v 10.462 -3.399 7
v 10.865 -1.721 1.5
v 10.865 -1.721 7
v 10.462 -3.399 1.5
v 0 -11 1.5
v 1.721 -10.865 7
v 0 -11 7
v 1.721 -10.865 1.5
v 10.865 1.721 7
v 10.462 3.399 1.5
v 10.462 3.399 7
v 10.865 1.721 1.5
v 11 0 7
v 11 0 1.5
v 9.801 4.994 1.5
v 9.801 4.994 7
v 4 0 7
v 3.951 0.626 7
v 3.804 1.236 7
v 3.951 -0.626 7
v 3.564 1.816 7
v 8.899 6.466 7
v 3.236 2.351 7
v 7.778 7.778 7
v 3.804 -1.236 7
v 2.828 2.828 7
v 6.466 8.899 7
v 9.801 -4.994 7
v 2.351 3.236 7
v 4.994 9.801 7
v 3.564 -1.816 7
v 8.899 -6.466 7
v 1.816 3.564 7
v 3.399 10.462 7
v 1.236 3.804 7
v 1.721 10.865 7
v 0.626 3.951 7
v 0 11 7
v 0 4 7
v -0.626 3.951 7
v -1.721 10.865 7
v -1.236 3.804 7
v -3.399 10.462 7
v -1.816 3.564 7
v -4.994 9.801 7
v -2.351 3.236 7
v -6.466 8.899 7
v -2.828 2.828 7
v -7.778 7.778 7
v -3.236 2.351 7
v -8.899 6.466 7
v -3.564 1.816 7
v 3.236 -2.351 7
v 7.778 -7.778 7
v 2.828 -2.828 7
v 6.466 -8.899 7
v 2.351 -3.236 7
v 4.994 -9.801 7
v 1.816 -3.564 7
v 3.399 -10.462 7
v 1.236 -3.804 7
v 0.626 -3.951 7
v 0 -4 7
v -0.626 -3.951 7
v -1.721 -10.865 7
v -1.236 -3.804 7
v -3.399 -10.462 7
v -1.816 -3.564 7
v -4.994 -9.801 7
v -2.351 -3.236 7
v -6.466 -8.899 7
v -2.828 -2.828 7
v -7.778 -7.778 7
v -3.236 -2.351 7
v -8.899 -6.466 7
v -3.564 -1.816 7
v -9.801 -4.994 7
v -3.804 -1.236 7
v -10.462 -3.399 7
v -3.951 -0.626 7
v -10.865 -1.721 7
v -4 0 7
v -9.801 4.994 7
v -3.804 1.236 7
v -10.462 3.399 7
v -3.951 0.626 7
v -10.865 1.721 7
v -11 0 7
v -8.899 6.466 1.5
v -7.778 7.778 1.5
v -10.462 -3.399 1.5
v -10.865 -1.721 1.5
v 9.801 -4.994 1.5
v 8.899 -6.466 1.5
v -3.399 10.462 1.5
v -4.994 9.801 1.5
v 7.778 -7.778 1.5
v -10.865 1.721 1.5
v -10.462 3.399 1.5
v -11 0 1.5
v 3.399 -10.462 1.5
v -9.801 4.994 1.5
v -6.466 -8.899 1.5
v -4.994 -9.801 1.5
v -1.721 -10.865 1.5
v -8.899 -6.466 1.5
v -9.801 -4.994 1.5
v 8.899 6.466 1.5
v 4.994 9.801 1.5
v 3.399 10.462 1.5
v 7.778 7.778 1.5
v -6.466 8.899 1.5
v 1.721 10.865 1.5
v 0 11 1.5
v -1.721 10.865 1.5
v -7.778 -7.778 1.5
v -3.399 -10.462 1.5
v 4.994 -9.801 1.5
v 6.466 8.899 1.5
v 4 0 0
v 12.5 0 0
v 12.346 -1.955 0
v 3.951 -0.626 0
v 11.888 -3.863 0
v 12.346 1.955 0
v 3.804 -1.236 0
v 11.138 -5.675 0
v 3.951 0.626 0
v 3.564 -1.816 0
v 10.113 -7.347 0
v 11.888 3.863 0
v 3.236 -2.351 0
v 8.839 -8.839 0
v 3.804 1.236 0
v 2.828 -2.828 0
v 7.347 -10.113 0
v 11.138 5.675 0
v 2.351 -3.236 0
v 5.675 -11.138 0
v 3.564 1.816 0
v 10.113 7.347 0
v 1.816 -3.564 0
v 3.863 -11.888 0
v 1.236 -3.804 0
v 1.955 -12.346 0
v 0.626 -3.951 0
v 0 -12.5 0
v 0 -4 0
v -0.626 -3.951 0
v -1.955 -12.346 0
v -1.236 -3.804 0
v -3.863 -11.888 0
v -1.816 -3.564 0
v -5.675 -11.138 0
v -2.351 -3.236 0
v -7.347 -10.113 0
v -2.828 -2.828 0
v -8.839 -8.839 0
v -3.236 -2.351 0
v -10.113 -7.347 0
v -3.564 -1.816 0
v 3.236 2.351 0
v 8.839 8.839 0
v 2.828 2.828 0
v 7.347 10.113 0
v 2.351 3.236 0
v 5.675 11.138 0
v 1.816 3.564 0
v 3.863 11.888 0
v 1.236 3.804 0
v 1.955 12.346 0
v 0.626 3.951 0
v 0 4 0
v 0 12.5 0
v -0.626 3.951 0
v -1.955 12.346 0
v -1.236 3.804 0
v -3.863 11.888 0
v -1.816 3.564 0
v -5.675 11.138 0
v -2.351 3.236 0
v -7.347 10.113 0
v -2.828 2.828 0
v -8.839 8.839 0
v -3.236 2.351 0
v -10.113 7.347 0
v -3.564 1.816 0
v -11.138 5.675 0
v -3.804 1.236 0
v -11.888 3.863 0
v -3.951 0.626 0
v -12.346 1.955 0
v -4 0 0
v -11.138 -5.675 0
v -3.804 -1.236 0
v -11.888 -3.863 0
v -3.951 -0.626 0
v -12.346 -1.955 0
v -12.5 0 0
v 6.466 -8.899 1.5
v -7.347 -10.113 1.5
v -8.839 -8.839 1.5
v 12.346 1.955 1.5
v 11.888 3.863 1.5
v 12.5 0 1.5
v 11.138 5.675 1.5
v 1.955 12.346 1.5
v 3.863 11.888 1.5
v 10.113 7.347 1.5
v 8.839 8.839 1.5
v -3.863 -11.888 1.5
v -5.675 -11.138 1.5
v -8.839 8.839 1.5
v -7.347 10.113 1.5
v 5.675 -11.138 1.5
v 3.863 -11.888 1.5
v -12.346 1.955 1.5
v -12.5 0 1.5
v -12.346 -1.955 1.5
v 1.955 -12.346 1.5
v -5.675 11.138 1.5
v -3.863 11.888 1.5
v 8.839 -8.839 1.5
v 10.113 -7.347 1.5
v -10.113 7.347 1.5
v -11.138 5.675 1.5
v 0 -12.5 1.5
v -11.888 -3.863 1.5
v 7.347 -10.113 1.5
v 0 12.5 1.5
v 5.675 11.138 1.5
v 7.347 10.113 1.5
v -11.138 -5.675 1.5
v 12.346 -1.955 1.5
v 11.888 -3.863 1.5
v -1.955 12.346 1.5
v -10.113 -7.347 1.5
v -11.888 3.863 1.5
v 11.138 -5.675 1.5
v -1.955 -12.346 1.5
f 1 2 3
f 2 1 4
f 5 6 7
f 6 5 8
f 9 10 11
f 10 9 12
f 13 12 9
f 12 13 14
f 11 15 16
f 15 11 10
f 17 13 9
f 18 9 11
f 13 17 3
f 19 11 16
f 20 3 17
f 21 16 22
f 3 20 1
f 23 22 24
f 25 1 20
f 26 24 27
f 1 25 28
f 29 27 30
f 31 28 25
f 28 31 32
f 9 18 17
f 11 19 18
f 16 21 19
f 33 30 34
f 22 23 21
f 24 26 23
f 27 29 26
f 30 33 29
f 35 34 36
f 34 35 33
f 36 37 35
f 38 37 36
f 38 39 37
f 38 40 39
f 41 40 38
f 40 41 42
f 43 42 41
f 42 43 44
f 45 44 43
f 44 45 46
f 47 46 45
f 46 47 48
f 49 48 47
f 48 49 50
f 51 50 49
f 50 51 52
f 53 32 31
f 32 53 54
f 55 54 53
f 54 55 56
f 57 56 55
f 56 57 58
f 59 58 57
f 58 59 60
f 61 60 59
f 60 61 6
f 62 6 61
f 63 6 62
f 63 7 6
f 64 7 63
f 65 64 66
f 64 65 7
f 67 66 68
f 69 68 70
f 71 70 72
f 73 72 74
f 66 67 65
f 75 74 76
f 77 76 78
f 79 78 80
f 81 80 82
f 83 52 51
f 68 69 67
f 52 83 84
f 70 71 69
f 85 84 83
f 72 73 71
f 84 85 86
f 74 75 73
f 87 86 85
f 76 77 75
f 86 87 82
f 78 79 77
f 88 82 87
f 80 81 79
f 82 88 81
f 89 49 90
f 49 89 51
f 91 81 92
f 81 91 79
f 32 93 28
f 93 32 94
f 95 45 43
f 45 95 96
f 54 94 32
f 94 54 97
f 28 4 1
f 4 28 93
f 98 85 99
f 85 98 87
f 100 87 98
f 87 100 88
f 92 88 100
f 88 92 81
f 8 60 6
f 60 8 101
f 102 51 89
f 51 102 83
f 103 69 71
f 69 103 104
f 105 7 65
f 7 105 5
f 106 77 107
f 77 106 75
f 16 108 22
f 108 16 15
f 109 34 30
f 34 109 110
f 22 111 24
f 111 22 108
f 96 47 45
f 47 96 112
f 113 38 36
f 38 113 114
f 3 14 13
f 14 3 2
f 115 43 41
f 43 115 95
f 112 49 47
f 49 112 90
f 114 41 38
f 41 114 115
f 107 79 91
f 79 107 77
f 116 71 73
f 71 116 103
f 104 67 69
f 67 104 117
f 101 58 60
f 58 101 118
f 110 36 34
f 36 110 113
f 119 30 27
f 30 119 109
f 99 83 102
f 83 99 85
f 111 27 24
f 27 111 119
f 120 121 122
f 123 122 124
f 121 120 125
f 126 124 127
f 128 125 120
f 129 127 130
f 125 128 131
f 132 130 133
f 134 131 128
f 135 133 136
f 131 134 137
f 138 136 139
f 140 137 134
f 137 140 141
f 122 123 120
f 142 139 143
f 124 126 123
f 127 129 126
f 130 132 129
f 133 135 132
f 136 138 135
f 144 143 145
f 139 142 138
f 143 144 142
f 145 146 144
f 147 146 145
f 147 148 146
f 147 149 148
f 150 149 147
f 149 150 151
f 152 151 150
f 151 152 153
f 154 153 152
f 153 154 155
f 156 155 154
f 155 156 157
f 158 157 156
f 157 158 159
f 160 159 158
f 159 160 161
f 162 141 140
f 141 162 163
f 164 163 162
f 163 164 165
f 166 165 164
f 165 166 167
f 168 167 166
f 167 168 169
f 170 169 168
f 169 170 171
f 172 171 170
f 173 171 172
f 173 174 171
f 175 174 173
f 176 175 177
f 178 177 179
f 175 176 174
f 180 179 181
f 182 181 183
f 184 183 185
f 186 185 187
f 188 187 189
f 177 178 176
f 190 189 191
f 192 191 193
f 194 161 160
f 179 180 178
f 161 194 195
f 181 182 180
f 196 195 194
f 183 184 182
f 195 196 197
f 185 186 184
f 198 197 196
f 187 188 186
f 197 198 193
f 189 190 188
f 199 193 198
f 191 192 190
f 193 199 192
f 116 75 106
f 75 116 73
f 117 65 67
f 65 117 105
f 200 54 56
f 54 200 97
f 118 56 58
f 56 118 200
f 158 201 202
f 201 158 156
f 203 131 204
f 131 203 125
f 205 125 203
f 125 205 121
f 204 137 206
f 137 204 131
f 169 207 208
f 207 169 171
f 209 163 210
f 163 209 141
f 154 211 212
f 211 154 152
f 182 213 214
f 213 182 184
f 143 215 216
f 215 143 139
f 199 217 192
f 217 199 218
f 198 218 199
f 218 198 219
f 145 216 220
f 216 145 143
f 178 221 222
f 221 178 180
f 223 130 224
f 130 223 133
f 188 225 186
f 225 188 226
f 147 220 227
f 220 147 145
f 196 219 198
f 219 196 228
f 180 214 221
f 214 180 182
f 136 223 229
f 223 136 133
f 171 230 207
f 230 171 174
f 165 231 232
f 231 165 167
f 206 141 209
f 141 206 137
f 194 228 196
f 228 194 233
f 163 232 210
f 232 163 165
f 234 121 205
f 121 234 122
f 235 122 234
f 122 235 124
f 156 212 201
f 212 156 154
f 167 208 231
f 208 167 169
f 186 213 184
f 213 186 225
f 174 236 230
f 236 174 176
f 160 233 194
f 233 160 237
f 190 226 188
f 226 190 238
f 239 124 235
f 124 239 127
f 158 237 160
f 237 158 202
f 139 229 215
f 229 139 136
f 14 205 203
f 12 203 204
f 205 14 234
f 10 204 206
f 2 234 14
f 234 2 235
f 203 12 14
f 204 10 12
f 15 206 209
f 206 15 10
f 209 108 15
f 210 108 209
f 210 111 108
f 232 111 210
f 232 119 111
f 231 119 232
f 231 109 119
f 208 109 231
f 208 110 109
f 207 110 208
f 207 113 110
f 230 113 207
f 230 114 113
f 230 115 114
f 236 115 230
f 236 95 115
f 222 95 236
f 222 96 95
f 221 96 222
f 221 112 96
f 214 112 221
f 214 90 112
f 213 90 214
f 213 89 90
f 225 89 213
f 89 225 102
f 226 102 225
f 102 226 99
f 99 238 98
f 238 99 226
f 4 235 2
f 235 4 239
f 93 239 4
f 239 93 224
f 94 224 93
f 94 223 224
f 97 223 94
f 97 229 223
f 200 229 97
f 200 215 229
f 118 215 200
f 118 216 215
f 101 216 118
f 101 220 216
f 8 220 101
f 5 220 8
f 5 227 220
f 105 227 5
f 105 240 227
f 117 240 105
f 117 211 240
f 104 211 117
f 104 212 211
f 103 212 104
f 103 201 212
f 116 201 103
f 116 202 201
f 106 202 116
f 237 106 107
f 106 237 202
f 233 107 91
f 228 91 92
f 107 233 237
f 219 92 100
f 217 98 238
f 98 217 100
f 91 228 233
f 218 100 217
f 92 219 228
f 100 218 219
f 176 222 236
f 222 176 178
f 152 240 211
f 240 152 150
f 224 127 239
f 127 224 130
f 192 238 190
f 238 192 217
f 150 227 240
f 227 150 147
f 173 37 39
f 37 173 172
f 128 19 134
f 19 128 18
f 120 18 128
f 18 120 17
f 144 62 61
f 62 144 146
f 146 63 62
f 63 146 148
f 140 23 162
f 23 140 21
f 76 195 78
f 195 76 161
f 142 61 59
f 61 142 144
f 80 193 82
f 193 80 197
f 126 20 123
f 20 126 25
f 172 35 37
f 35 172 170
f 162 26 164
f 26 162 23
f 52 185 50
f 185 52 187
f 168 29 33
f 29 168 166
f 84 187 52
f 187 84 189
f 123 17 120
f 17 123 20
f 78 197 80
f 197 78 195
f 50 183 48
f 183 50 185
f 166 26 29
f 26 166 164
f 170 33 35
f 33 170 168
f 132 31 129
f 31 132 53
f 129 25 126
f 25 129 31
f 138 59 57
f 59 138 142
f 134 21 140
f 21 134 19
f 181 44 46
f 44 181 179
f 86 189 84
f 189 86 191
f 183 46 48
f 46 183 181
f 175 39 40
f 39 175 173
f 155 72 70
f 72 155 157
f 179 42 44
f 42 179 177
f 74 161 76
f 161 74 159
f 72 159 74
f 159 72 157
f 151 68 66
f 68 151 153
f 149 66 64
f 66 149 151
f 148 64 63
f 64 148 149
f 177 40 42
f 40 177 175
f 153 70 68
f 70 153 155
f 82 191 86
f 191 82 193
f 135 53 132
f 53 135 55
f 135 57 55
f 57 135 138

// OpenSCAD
/*
    ŁOŻYSKO F608ZZ Z FLANSZĄ
*/

$fn = 40;

F608ZZ();
module F608ZZ()
{
    aluminum = [0.92, 0.92, 0.92];
    color(aluminum,1)
    difference()
    {
    union()
    {
    cylinder(h=7, d=22, center=false);
    cylinder(h=1.5, d=25, center=false);
    }
    translate([0,0,-1])
    cylinder(h=9, d=8, center=false);
    }
}
